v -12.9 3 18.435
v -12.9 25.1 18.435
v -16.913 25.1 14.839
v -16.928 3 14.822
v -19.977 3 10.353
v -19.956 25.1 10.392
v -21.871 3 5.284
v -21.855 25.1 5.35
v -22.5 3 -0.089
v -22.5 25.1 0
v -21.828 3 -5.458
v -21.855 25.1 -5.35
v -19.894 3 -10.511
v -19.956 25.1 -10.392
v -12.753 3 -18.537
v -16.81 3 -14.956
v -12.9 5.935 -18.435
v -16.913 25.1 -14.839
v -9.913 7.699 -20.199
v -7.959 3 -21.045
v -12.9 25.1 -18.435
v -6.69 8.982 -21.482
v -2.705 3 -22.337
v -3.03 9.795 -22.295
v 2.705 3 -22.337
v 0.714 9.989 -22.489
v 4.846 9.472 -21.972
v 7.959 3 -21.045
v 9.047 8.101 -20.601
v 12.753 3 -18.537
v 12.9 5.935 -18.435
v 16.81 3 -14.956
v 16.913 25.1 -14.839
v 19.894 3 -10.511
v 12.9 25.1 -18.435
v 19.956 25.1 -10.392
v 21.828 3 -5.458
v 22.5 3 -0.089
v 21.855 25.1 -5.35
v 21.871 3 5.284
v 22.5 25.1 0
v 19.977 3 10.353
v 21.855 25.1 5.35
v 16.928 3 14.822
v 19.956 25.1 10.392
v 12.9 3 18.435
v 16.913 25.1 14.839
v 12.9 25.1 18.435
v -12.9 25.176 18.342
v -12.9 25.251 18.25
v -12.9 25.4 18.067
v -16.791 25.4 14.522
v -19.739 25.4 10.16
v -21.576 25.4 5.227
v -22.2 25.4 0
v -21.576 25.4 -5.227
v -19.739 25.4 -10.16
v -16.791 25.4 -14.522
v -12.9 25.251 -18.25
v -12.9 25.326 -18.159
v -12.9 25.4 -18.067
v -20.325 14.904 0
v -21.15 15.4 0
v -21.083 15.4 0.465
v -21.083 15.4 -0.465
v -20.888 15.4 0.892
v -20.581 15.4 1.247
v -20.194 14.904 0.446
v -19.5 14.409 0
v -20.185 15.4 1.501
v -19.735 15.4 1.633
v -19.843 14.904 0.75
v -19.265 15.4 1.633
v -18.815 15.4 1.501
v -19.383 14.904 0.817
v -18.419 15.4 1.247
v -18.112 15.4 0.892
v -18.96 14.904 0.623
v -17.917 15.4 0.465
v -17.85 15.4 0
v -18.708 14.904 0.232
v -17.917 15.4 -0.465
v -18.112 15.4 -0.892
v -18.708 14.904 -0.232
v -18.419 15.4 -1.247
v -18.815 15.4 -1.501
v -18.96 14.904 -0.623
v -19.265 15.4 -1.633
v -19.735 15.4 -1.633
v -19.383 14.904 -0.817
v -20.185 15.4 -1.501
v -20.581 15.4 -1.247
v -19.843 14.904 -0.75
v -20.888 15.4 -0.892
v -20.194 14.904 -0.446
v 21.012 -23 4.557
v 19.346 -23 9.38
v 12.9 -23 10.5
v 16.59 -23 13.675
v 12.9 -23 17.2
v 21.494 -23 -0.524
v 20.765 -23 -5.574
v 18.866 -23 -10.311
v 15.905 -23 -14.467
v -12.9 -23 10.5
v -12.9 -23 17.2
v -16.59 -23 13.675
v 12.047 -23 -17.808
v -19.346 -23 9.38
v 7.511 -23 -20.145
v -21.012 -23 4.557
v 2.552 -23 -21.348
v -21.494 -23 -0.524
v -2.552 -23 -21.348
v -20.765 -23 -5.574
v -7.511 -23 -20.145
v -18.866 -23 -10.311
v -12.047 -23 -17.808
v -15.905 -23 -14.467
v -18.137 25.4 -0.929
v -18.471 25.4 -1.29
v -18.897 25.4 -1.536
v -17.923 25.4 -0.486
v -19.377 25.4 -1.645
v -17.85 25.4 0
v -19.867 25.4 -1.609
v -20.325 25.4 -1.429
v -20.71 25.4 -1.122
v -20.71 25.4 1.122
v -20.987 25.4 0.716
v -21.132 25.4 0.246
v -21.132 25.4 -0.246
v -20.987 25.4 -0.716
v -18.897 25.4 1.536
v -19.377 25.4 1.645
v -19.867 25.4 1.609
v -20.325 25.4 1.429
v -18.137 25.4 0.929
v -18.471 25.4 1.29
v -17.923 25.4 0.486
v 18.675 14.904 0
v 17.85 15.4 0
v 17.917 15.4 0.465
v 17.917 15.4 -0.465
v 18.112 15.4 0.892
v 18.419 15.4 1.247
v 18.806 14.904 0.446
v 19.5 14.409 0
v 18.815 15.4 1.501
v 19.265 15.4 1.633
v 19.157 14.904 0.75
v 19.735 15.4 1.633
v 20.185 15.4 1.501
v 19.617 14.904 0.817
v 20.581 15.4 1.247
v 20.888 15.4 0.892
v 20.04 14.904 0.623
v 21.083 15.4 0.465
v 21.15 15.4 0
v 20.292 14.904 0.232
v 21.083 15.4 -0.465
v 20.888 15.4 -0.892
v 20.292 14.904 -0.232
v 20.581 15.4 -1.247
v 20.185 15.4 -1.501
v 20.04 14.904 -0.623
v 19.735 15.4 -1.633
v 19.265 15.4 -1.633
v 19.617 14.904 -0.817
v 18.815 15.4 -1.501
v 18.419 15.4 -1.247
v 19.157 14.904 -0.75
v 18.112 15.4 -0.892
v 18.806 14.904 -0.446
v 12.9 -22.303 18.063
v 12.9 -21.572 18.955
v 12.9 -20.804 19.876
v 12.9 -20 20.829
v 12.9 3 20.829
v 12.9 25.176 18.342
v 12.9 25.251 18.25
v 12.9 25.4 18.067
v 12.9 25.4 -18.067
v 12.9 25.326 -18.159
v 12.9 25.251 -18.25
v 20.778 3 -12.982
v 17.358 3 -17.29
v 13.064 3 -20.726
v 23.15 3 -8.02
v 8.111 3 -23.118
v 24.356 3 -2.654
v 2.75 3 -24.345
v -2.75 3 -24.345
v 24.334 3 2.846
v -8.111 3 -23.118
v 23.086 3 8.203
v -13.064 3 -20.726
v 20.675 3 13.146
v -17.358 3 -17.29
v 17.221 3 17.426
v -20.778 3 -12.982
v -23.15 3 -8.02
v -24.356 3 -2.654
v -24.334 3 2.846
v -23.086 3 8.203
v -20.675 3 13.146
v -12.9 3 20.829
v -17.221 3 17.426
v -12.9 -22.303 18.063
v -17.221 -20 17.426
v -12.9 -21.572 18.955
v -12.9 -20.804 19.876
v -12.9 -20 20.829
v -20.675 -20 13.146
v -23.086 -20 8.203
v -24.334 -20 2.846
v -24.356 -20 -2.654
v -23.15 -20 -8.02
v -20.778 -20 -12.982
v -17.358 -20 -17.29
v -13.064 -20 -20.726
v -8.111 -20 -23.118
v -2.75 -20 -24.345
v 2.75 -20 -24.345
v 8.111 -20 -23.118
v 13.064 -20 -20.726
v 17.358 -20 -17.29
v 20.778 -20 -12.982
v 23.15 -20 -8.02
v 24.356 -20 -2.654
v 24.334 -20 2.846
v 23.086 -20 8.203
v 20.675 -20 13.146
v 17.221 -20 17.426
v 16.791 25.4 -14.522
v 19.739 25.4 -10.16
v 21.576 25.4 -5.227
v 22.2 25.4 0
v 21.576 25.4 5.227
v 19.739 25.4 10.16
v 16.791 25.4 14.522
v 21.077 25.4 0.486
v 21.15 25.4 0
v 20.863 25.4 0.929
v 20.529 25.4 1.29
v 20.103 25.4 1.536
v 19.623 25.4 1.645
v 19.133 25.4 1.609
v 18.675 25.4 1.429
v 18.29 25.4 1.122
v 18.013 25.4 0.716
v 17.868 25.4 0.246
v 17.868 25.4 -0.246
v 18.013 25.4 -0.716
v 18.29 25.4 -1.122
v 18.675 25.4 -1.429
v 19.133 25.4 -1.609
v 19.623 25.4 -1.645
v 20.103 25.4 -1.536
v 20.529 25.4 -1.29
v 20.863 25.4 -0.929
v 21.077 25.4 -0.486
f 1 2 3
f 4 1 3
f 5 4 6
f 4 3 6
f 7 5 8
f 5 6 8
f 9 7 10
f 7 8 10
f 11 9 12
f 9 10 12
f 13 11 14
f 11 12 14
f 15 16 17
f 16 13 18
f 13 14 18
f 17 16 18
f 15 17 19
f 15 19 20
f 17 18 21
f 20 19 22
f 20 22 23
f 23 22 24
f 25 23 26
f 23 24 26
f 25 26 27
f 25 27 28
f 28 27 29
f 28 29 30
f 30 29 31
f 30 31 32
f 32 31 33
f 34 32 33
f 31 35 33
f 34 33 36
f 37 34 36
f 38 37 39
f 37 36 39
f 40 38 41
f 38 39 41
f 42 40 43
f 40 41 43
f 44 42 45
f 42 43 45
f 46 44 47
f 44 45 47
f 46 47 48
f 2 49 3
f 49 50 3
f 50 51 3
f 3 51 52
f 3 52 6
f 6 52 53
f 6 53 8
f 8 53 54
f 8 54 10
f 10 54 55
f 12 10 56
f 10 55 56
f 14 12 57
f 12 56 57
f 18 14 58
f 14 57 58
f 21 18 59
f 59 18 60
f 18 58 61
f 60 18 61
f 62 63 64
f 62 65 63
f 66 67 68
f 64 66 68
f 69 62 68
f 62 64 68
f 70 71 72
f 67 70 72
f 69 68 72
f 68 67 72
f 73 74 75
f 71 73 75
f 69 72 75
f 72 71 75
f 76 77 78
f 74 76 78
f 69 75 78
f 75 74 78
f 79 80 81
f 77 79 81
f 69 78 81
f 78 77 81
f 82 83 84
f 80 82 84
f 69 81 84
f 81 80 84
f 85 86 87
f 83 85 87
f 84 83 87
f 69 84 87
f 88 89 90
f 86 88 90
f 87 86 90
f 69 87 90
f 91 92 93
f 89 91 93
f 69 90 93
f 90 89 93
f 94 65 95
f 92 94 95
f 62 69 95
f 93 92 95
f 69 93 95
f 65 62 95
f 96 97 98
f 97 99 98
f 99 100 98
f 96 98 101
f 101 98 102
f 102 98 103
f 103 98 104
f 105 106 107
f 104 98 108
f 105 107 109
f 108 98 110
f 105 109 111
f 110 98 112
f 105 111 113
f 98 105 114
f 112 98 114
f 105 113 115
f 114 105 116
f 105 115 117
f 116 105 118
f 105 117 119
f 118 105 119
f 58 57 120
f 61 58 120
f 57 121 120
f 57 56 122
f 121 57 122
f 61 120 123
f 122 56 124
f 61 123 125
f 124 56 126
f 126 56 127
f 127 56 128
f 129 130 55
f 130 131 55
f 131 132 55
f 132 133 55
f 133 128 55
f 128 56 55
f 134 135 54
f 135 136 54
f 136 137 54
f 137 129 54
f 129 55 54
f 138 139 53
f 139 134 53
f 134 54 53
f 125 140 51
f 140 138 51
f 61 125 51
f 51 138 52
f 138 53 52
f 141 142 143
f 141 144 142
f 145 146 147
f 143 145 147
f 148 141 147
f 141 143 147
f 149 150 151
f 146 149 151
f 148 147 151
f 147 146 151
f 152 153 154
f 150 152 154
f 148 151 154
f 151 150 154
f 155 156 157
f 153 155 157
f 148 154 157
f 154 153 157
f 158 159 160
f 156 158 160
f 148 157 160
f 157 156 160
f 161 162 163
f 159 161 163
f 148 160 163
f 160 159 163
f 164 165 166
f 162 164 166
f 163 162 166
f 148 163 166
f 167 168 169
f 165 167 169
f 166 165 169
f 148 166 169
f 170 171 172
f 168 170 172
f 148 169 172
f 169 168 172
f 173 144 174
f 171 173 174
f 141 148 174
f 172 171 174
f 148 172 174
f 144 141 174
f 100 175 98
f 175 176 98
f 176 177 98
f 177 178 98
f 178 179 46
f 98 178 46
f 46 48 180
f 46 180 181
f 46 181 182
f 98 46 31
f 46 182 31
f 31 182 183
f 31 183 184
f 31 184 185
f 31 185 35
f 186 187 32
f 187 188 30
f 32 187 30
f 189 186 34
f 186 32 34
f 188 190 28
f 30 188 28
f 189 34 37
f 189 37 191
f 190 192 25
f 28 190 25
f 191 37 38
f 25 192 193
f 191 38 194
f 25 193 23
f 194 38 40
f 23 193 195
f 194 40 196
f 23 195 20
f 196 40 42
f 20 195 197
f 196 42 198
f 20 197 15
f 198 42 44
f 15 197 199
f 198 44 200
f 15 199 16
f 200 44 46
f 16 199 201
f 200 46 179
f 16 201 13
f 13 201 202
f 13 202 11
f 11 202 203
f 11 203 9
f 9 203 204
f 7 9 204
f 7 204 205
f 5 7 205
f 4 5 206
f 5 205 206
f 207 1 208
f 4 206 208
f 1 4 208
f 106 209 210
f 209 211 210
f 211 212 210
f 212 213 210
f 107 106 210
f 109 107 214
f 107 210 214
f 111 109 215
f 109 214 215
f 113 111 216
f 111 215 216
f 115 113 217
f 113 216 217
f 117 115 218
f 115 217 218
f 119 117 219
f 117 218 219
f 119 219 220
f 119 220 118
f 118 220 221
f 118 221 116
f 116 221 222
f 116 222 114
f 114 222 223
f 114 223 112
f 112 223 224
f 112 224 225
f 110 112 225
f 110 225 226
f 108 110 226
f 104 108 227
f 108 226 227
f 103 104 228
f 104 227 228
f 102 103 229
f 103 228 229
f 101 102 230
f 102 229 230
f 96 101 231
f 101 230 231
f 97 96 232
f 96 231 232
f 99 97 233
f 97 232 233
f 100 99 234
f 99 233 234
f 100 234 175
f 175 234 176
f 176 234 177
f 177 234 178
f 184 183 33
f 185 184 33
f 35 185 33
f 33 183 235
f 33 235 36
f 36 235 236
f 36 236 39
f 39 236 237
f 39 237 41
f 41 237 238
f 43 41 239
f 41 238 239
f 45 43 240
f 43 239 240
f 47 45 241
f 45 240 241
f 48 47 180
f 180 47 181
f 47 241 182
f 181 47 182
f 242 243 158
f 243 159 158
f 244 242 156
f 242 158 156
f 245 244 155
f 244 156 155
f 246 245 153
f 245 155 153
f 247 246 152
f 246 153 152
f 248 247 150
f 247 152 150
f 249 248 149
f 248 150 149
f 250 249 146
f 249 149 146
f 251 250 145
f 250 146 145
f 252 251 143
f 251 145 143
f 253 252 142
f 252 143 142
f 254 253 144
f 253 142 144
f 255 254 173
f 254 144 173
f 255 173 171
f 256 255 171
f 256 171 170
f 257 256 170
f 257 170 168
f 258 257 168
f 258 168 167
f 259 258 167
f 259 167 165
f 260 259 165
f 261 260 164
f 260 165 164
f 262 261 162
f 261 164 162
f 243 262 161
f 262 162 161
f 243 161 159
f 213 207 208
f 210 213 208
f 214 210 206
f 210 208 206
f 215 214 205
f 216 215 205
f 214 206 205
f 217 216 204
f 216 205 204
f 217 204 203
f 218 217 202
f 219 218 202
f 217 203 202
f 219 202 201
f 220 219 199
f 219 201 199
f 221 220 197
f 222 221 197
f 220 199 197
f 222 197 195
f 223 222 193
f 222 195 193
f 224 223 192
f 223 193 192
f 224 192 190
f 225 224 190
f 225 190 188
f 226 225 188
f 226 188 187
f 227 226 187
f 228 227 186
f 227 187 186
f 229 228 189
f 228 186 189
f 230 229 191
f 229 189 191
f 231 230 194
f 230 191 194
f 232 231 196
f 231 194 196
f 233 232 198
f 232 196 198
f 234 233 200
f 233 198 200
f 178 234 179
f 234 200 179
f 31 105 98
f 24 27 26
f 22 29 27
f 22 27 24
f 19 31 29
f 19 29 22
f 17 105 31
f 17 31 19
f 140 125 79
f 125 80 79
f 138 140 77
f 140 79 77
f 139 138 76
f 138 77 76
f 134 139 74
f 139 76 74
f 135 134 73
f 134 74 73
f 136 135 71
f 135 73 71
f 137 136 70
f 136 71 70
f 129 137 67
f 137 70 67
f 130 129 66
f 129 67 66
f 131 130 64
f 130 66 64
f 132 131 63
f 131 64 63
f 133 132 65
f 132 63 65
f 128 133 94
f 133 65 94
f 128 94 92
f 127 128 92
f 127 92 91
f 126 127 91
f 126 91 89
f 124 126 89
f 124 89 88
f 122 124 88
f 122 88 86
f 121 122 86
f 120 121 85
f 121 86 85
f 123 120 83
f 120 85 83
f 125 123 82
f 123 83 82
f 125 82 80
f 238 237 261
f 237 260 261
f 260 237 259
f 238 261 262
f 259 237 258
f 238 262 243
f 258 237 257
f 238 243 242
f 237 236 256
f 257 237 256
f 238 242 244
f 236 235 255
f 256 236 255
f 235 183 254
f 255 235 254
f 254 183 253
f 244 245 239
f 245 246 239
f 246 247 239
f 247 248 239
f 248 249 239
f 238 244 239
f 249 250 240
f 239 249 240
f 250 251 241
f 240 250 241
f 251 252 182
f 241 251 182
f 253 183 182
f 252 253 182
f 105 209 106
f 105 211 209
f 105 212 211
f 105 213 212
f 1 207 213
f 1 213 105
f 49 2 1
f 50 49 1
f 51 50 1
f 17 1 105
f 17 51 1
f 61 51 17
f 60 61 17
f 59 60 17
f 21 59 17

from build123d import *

# Parameters (mm, degrees)
ENL_V_MAT_EXTRU_1_DEPTH      = 12.9
ENL_V_MAT_EXTRU_1_DEPTH_BACK = 12.9
TROU_TARAUD_M4X0_71_D        = 3.3
TROU_TARAUD_M4X0_71_DEPTH    = 10
TROU_TARAUD_M4X0_71_TIP      = 0.991420021


with BuildPart() as part:
    # Esquisse1 → Révolution1 (revolve)
    with BuildSketch(Plane.XY):
        Polygon((0, -23), (21.5, -23), (24.5, -20), (24.5, 3), (22.5, 3), (22.5, 25.1), (22.2, 25.4), (0, 25.4), align=None)
    revolve(axis=Axis((0, 89.934503311, 0), (0, -1, 0)))

    # Esquisse2 → Enlèv. mat.-Extru.1 (cut, two sides: drawn at the far end of the back side and taken through both)
    with BuildSketch(Plane(origin=(0, 0, 0), x_dir=(0, 0, -1), z_dir=(1, 0, 0)).offset(-ENL_V_MAT_EXTRU_1_DEPTH_BACK)):
        Polygon((-24.5, -37), (24.5, 12), (24.5, 25.4), (-24.5, 25.4), align=None)
    extrude(amount=ENL_V_MAT_EXTRU_1_DEPTH + ENL_V_MAT_EXTRU_1_DEPTH_BACK, mode=Mode.SUBTRACT)

    # Trou taraudé M4x0.71
    with Locations(Plane(origin=(0, 25.4, 0), x_dir=(-1, 0, 0), z_dir=(0, 1, 0))):
        with Locations((-19.5, 0), (19.5, 0)):
            Hole(TROU_TARAUD_M4X0_71_D / 2, depth=TROU_TARAUD_M4X0_71_DEPTH)
            with Locations((0, 0, -(TROU_TARAUD_M4X0_71_DEPTH + TROU_TARAUD_M4X0_71_TIP / 2))):  # 118° drill point
                Cone(0, TROU_TARAUD_M4X0_71_D / 2, TROU_TARAUD_M4X0_71_TIP, mode=Mode.SUBTRACT)


solid = part.part
